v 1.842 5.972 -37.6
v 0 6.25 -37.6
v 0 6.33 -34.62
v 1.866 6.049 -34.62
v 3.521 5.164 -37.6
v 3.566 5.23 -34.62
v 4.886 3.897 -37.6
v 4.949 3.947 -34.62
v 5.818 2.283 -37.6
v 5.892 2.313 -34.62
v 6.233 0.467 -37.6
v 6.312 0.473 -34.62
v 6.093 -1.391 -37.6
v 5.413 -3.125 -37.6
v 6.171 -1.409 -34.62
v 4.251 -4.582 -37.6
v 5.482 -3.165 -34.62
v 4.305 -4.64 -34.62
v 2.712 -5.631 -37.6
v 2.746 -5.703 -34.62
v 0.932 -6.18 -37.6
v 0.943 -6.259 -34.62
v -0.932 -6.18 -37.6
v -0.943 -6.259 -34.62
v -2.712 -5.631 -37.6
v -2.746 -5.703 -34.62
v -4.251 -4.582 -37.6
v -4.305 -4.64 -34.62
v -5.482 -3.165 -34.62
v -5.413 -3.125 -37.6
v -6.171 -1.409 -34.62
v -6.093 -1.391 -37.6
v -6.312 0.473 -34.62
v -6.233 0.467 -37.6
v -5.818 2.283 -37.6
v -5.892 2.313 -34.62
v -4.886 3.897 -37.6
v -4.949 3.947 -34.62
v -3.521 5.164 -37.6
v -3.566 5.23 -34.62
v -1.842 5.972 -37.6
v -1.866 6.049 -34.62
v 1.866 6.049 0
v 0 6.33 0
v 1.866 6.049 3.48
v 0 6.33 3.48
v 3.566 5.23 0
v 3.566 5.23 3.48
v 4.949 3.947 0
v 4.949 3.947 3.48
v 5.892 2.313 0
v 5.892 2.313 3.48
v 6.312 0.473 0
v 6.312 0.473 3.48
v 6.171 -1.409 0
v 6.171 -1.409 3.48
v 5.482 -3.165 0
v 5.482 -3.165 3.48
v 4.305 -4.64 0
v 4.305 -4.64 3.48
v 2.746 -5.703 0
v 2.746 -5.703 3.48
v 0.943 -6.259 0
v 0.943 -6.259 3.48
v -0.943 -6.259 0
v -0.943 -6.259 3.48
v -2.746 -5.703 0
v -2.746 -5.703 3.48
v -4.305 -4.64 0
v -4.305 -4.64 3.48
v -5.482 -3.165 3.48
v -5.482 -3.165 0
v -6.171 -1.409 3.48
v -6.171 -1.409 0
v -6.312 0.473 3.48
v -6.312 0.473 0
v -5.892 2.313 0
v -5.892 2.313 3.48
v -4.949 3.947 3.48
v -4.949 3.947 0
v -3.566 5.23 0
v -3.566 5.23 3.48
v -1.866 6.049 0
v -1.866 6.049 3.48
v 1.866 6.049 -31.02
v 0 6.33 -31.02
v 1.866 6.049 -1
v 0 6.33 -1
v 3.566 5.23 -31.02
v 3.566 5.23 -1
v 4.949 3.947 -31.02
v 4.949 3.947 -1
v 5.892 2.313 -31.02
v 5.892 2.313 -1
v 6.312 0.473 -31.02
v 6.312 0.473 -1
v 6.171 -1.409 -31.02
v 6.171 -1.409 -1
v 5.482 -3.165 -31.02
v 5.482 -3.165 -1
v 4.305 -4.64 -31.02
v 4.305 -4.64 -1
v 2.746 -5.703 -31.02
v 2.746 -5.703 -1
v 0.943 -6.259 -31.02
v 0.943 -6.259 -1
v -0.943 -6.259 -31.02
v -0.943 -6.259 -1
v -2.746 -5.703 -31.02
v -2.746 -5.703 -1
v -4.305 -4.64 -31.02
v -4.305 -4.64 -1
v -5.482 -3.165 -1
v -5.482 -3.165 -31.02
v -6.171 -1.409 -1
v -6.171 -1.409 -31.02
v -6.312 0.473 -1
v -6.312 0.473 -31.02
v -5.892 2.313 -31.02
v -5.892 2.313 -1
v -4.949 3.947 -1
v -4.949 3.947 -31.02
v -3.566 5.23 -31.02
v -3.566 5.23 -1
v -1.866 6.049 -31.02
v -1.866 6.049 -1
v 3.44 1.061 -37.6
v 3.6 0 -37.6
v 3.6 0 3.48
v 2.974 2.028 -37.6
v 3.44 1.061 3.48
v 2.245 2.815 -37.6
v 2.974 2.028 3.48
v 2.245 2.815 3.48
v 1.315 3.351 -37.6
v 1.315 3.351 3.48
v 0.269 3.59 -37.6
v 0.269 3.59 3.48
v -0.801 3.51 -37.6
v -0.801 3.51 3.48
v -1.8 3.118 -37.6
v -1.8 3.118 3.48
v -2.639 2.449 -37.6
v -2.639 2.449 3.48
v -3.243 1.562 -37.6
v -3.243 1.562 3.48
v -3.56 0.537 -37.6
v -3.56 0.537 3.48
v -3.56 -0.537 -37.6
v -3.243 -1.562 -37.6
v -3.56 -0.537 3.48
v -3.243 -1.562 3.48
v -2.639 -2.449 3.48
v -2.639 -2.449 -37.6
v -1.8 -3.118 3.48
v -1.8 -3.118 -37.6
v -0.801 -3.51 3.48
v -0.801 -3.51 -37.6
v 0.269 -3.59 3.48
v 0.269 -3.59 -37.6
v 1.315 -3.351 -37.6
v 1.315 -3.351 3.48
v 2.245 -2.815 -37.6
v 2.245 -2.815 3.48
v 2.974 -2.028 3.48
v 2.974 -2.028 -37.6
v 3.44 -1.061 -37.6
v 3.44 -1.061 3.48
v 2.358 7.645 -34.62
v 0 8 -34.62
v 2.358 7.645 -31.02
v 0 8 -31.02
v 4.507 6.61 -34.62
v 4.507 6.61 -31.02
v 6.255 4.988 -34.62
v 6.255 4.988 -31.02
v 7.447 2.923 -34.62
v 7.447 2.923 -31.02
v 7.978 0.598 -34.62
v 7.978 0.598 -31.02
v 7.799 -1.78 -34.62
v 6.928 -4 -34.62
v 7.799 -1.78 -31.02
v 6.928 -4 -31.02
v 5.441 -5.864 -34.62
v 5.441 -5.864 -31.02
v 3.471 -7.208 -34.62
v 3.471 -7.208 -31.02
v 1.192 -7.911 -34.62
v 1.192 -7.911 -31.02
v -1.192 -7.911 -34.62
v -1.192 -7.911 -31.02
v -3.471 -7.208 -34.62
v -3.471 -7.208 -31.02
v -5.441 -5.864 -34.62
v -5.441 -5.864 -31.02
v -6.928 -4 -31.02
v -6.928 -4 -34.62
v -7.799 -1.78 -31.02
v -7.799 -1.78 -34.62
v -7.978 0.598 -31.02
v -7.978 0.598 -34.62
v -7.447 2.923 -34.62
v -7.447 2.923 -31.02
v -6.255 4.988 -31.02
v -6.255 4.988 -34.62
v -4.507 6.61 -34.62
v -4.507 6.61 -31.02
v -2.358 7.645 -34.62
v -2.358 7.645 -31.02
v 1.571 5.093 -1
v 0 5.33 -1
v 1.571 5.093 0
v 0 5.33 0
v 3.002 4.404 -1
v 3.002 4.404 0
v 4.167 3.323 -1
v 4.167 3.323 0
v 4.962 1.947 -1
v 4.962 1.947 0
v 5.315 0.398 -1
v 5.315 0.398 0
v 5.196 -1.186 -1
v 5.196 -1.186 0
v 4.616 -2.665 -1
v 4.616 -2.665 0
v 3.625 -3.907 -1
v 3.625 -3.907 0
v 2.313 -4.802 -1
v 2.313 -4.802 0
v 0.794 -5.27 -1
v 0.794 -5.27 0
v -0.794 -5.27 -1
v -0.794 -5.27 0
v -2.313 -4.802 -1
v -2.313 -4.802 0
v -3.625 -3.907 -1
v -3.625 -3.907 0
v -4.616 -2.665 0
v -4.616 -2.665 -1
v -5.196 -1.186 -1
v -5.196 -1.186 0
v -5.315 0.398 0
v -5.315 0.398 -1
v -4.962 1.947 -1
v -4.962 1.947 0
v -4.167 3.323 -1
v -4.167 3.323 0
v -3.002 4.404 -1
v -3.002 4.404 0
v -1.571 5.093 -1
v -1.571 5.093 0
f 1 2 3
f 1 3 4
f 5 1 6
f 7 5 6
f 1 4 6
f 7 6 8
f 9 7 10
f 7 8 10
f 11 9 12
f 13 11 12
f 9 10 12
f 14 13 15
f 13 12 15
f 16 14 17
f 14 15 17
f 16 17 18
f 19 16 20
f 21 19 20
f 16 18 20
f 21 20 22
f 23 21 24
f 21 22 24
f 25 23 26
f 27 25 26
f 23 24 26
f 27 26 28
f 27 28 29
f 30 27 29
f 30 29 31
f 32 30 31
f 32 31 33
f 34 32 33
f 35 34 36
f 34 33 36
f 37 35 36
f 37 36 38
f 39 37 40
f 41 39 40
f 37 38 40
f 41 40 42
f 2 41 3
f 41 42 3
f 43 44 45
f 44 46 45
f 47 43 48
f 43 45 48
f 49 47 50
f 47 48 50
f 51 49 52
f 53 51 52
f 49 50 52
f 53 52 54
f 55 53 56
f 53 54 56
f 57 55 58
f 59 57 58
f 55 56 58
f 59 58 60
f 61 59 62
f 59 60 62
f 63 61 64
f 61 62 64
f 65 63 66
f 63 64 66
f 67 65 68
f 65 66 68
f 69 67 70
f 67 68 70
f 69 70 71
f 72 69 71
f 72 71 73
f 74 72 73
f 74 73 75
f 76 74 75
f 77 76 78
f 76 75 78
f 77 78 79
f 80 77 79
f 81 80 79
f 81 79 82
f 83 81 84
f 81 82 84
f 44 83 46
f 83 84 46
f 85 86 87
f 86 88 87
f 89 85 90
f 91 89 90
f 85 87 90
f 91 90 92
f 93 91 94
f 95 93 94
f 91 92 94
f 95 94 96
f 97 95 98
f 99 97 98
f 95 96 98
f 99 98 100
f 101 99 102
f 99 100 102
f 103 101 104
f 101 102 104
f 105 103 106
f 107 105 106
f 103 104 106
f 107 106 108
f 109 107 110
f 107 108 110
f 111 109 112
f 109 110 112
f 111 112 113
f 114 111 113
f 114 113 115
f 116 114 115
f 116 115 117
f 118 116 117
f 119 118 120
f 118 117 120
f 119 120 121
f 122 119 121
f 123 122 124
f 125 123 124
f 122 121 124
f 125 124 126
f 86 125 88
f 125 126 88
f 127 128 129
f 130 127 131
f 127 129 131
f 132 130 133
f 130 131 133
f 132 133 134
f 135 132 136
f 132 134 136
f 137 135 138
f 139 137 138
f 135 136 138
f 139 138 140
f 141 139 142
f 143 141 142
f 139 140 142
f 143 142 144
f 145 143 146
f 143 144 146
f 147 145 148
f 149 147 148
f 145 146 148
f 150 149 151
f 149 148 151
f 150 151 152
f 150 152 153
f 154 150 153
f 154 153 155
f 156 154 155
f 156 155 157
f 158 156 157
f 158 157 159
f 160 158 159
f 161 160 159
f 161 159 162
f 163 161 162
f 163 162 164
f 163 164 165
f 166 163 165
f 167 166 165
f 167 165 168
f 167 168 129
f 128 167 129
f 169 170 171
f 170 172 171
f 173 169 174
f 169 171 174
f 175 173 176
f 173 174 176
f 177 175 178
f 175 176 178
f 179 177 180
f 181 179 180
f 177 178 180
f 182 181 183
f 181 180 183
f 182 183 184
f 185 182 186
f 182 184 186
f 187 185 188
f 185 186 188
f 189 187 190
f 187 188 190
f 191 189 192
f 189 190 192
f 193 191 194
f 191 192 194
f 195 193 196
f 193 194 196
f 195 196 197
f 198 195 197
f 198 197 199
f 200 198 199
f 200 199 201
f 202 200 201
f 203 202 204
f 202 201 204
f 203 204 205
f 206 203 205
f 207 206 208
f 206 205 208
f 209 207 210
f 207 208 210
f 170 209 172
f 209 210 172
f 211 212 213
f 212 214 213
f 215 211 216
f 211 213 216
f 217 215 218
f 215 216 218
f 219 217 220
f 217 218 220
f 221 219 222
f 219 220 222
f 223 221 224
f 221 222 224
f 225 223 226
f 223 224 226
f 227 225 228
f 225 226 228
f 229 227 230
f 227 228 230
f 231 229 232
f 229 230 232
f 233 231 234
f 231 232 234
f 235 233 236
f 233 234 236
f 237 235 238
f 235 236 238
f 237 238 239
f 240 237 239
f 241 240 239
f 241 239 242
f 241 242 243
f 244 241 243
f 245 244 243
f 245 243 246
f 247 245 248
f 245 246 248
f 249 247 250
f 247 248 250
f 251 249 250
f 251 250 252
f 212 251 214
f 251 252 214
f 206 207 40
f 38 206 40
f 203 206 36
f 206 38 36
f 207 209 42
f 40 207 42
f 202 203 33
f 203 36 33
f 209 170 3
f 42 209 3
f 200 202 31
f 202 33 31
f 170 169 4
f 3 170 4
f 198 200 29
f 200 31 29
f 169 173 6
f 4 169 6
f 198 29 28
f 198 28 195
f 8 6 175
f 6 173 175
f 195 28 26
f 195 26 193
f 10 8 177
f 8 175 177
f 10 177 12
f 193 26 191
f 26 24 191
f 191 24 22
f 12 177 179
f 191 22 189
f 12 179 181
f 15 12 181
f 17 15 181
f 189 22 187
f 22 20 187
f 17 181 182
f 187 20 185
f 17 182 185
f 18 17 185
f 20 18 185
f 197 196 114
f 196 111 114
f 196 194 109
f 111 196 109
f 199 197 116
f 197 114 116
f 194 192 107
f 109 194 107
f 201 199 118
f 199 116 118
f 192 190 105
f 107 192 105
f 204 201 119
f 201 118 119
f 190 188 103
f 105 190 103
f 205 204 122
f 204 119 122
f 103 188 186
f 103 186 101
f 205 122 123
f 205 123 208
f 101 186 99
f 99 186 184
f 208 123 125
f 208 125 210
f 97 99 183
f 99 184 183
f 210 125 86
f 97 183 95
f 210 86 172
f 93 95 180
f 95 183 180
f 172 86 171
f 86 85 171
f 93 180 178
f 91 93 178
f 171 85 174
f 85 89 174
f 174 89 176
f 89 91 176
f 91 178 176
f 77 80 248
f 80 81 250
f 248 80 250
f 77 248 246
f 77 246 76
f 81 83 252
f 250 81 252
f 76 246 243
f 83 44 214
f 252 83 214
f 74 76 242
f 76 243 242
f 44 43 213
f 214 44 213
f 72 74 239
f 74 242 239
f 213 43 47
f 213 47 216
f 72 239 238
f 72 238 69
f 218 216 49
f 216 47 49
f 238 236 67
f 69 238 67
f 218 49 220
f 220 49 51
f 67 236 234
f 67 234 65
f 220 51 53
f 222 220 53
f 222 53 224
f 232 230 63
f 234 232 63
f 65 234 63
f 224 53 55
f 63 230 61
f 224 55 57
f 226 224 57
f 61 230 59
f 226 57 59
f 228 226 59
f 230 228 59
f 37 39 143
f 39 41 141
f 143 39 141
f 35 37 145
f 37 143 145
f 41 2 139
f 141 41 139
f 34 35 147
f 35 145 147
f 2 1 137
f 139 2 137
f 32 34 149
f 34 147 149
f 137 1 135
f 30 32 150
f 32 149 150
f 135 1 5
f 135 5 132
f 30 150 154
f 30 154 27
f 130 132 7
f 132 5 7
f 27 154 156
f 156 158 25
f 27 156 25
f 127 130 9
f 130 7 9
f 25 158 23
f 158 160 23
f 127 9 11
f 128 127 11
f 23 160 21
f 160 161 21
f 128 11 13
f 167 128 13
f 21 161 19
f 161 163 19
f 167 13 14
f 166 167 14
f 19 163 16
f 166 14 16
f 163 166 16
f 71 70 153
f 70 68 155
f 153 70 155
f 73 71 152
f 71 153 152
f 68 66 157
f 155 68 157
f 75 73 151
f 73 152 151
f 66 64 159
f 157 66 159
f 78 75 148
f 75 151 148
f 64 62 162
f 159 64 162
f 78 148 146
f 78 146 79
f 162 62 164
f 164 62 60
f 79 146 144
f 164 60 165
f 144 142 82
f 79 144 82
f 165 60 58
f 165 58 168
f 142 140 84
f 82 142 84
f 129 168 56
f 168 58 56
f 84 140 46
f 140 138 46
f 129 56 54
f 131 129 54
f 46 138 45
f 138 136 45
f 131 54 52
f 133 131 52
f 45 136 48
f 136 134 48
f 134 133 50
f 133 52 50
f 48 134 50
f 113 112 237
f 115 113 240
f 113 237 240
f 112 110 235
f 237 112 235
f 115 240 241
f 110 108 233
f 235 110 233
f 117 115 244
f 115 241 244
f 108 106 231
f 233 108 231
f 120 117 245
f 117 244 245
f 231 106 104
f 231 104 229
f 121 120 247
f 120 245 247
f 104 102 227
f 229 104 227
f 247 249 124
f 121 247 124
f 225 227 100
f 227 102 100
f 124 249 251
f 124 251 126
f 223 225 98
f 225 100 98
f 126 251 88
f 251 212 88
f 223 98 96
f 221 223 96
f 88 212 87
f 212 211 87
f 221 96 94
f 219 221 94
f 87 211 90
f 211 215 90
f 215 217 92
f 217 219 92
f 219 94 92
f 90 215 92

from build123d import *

# Parameters (mm, degrees)
F2_R     = 3.6
F3_DEPTH = 41.081


with BuildPart() as f1:
    # F0 (on Right) → F1 (revolve)
    with BuildSketch(Plane.YZ):
        Polygon((6.33, 3.48), (0, 3.48), (0, -37.6), (6.25, -37.6), (6.33, -34.62), (8, -34.62), (8, -31.02), (6.33, -31.02), (6.33, -1), (5.33, -1), (5.33, 0), (6.33, 0), align=None)
    revolve(axis=Axis((0, 0, -17.06), (0, 0, -1)))

    # F2 (on face) → F3 (cut, through all)
    with BuildSketch(Plane.XY.offset(3.48)):
        Circle(F2_R)
    extrude(amount=-F3_DEPTH, mode=Mode.SUBTRACT)


solid = f1.part
